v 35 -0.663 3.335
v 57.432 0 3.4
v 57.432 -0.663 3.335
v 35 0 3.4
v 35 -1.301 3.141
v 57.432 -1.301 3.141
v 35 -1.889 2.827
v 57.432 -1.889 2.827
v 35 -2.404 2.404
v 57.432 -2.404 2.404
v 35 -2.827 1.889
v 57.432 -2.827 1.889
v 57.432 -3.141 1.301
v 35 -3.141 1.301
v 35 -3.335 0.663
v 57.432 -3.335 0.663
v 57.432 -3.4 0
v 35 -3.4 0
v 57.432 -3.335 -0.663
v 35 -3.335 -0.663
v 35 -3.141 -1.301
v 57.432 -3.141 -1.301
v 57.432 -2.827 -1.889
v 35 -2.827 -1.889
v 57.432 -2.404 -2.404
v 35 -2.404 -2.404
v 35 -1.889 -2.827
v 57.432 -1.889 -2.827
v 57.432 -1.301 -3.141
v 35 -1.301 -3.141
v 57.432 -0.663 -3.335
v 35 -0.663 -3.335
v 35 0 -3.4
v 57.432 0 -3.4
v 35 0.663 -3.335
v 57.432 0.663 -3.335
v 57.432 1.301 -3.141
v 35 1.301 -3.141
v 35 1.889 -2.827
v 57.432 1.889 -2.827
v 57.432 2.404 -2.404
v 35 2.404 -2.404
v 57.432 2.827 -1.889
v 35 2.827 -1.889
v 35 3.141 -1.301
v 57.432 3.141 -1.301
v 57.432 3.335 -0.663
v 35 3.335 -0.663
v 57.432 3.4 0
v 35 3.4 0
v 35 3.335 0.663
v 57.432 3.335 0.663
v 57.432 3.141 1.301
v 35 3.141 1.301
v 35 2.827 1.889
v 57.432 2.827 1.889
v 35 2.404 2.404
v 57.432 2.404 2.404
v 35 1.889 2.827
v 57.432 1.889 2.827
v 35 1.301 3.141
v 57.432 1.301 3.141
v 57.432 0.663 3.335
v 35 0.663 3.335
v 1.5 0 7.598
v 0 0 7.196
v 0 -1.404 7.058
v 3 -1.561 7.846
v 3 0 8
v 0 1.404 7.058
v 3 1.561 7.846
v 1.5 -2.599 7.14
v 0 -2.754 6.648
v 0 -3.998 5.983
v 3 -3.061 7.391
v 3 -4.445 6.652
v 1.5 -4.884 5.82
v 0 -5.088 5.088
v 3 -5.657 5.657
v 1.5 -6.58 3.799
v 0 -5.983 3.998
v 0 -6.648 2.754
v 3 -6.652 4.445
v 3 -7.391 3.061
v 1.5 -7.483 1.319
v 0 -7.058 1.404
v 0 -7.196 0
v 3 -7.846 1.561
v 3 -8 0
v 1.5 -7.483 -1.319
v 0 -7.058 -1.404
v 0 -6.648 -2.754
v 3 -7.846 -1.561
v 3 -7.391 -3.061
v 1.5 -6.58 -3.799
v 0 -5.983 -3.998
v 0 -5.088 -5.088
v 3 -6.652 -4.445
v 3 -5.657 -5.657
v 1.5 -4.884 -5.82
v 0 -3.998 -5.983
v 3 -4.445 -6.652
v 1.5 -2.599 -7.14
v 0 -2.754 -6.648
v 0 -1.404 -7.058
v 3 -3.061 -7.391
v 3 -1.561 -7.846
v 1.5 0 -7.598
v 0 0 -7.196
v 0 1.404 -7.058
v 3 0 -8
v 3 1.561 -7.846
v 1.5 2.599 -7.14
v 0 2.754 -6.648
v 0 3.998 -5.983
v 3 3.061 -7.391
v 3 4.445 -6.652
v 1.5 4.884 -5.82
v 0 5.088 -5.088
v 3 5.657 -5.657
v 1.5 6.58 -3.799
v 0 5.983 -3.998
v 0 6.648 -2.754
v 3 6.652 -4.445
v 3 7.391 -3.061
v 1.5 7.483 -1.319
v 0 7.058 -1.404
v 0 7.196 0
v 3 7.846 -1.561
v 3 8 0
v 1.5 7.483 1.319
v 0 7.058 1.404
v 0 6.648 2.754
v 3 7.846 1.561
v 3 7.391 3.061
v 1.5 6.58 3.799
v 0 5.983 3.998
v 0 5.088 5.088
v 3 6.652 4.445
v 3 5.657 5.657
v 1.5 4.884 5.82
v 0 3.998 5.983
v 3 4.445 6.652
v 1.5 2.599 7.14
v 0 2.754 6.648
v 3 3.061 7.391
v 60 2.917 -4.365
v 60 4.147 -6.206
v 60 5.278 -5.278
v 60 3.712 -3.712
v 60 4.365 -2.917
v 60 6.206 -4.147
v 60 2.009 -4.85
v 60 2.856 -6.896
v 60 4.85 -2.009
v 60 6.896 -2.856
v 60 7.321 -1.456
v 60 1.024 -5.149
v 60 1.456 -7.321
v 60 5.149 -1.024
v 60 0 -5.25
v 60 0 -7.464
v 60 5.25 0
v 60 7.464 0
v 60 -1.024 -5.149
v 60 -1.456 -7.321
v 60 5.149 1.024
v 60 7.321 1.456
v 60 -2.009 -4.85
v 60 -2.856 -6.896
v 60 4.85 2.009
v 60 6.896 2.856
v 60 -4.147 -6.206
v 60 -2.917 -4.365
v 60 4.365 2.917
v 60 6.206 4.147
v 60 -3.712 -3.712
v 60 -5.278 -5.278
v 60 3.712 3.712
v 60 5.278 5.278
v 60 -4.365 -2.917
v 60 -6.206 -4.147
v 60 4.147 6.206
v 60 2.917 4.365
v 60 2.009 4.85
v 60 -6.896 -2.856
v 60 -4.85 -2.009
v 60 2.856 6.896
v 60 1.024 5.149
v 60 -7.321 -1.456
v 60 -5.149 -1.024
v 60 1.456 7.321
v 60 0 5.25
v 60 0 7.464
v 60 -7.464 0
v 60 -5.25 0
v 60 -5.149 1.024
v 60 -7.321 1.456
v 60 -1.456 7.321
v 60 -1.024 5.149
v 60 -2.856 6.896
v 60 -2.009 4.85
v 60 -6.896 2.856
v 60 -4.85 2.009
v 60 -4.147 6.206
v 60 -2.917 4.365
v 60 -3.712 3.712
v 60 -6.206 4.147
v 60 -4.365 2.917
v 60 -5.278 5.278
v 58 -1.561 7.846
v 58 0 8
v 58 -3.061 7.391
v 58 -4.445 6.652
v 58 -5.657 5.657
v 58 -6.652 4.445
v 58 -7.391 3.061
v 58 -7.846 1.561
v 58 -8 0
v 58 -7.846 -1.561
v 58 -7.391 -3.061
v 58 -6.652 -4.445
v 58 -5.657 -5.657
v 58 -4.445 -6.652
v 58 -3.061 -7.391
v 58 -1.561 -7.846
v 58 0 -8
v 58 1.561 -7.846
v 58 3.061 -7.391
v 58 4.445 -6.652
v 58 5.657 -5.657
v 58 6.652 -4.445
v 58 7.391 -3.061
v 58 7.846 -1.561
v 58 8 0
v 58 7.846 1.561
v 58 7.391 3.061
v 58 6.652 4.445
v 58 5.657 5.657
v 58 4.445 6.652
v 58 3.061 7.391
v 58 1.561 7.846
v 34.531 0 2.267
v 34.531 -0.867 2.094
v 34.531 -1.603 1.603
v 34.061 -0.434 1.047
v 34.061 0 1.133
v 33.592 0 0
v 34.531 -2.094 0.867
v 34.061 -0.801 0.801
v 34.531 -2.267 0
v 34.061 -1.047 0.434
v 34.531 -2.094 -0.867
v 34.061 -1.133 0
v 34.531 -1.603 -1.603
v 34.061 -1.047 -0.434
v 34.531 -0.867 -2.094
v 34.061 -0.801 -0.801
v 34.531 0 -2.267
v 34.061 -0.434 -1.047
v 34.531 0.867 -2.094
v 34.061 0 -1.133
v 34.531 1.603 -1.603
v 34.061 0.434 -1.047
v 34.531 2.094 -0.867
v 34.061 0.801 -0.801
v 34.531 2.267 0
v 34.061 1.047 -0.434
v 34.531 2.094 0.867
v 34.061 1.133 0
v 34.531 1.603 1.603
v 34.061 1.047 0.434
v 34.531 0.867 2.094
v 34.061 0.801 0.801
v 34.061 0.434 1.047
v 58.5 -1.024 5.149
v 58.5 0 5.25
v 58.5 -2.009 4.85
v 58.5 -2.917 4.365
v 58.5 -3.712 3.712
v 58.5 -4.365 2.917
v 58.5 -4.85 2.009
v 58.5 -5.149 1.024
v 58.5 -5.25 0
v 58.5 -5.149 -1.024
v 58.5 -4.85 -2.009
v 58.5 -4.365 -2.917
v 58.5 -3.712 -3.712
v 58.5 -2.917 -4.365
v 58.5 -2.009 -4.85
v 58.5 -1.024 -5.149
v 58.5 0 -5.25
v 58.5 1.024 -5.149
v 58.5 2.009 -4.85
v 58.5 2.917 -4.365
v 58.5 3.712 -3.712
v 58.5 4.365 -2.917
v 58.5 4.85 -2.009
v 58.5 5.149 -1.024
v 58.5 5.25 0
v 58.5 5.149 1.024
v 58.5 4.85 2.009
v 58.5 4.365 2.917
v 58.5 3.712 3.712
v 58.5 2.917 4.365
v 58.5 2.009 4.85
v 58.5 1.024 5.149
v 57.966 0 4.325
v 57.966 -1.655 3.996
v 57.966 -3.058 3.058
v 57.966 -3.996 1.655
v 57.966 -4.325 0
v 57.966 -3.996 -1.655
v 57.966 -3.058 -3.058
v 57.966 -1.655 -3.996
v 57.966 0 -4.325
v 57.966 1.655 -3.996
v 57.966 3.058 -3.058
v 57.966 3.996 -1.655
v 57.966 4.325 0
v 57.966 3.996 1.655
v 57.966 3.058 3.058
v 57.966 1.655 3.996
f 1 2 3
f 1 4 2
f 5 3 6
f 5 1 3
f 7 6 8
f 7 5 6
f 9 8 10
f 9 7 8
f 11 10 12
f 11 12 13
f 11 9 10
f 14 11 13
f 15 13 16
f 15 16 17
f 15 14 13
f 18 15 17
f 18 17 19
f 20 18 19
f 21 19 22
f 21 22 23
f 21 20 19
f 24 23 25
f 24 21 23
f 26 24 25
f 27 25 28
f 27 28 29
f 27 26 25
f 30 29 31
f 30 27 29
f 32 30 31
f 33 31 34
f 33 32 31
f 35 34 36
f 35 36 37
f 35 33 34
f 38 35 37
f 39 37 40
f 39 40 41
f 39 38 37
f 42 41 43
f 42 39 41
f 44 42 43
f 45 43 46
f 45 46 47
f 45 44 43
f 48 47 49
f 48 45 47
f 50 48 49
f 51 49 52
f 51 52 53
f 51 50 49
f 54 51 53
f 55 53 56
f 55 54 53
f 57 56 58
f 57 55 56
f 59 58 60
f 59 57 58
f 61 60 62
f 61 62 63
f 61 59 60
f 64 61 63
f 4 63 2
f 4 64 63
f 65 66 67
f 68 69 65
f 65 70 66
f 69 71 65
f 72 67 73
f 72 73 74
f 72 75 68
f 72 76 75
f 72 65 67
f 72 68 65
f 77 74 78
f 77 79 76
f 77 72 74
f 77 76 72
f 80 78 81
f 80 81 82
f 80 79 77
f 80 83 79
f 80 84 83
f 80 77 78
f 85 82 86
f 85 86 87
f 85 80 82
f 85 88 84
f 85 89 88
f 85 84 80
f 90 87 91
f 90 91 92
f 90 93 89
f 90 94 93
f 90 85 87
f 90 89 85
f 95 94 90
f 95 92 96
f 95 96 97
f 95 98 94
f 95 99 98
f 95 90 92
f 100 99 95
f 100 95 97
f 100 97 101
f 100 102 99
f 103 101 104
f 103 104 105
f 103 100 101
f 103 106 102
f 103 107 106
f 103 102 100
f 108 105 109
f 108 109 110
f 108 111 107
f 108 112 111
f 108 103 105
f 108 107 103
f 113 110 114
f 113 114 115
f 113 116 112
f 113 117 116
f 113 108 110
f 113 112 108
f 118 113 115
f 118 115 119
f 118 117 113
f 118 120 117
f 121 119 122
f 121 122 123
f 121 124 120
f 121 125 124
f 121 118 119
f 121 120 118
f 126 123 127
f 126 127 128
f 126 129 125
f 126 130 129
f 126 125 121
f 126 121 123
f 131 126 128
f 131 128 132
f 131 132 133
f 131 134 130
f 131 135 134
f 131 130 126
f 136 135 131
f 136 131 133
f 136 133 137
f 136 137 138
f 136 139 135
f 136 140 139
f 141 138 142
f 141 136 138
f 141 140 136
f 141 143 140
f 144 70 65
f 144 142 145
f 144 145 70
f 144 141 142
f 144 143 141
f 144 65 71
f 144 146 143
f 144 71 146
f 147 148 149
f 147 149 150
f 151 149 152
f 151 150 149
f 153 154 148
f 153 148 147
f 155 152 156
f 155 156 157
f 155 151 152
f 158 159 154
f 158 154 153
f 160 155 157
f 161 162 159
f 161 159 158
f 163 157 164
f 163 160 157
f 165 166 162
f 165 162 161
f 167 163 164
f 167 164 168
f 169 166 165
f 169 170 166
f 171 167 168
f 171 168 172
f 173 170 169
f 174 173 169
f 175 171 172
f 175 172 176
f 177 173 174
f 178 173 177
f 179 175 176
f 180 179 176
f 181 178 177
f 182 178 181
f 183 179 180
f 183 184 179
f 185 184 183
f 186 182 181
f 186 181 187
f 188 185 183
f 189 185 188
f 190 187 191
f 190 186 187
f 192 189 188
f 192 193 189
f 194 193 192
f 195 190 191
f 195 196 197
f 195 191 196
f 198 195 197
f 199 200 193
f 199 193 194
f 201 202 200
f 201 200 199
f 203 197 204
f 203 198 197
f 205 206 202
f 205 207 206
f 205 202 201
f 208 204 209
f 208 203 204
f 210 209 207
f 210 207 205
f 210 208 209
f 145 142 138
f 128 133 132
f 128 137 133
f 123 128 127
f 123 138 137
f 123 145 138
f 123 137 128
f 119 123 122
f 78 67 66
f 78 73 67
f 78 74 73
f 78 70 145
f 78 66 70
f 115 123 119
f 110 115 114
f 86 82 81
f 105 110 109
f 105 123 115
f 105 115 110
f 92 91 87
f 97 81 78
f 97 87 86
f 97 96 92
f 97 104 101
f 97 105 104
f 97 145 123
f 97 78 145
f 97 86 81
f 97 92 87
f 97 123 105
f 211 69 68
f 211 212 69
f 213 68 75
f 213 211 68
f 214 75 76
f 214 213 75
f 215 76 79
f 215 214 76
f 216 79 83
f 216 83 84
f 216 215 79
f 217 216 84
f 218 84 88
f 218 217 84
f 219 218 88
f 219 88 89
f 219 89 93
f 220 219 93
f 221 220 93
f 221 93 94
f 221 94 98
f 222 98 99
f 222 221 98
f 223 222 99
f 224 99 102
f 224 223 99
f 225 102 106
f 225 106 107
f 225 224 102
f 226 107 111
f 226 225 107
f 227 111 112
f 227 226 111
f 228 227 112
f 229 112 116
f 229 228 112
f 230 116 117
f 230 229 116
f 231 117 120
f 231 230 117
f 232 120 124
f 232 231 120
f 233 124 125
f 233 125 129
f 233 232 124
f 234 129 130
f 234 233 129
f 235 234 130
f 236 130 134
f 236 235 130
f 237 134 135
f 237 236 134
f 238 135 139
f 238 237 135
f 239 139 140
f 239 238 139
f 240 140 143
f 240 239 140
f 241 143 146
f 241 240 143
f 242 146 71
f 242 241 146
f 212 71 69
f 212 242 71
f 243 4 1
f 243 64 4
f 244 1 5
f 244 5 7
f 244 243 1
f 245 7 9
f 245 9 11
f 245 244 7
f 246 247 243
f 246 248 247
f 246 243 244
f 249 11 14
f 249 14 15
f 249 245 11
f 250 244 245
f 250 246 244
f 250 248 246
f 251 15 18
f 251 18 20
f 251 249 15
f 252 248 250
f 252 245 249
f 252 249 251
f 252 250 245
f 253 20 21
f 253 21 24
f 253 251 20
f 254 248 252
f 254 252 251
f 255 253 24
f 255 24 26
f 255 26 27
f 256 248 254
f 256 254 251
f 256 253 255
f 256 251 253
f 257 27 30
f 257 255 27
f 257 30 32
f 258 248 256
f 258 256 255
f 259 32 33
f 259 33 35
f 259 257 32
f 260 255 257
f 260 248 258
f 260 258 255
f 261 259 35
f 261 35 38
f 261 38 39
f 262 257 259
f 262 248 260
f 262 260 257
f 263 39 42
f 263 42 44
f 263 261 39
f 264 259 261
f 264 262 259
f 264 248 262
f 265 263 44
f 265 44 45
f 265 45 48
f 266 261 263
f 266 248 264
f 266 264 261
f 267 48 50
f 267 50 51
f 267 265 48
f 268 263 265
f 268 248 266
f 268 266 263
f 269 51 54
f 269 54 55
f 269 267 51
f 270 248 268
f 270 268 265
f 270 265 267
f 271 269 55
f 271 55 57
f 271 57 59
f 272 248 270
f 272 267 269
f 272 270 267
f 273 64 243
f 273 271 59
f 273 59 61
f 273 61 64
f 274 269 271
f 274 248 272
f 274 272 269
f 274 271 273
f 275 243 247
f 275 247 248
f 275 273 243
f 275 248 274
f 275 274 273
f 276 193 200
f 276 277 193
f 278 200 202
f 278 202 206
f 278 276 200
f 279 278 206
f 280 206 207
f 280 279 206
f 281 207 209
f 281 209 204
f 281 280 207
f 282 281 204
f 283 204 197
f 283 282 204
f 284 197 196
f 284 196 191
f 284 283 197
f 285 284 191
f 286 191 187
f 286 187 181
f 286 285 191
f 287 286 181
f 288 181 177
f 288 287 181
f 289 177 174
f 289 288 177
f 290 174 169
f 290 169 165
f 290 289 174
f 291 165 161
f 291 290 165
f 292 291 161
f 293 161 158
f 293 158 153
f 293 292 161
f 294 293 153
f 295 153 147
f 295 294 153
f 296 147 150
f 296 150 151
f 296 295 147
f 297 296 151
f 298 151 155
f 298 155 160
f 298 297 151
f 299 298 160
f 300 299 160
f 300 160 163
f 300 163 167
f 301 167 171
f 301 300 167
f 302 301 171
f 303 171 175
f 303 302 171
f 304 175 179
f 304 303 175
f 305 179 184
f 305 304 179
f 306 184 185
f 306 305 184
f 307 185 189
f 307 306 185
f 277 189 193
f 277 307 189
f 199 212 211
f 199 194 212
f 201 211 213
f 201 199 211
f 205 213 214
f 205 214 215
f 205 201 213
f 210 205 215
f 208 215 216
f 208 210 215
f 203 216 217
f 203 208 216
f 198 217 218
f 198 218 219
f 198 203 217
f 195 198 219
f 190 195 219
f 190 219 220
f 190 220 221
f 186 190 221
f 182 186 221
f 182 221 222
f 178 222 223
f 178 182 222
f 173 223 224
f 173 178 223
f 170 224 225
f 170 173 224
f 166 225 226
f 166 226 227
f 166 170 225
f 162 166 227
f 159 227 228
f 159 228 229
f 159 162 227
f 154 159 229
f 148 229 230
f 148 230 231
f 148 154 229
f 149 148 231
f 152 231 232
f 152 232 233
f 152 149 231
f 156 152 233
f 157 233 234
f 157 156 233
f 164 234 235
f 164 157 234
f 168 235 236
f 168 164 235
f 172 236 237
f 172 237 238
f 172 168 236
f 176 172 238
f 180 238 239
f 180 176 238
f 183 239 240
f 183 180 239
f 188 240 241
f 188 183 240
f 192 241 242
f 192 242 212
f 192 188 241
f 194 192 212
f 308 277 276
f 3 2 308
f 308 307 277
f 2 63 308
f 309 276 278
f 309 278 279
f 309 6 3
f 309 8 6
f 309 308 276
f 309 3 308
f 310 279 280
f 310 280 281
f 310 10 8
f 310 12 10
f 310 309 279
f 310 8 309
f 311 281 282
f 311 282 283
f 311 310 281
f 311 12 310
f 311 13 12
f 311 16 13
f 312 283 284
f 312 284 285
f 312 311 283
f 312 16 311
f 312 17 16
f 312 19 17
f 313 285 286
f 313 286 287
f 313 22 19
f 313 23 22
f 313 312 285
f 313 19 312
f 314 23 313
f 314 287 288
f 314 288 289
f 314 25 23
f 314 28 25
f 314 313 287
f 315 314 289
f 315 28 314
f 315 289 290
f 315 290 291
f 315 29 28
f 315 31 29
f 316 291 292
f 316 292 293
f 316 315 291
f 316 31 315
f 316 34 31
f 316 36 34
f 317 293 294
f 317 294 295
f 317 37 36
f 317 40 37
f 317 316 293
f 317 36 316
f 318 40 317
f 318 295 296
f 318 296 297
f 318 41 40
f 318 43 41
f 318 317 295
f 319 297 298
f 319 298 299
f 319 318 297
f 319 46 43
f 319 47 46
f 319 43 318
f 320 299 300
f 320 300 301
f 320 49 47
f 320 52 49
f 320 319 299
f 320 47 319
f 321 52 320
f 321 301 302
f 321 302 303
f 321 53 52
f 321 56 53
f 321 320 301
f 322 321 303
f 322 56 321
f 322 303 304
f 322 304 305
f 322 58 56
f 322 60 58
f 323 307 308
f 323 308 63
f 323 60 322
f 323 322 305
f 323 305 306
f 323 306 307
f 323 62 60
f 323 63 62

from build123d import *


with BuildPart() as part:
    # BodySke → Body (revolve)
    with BuildSketch(Plane.XY, mode=Mode.PRIVATE) as body_sk:
        Polygon((3, 8), (58, 8), (60, 7.464101615), (60, 5.25), (58.5, 5.25), (57.431902002, 3.4), (35, 3.4), (33.591673888, 0), (0, 0), (0, 7.196152423), align=None)
    revolve(body_sk.sketch.rotate(Axis((0, 0, 0), (1, 0, 0)), 90), axis=Axis((0, 0, 0), (1, 0, 0)))


solid = part.part
